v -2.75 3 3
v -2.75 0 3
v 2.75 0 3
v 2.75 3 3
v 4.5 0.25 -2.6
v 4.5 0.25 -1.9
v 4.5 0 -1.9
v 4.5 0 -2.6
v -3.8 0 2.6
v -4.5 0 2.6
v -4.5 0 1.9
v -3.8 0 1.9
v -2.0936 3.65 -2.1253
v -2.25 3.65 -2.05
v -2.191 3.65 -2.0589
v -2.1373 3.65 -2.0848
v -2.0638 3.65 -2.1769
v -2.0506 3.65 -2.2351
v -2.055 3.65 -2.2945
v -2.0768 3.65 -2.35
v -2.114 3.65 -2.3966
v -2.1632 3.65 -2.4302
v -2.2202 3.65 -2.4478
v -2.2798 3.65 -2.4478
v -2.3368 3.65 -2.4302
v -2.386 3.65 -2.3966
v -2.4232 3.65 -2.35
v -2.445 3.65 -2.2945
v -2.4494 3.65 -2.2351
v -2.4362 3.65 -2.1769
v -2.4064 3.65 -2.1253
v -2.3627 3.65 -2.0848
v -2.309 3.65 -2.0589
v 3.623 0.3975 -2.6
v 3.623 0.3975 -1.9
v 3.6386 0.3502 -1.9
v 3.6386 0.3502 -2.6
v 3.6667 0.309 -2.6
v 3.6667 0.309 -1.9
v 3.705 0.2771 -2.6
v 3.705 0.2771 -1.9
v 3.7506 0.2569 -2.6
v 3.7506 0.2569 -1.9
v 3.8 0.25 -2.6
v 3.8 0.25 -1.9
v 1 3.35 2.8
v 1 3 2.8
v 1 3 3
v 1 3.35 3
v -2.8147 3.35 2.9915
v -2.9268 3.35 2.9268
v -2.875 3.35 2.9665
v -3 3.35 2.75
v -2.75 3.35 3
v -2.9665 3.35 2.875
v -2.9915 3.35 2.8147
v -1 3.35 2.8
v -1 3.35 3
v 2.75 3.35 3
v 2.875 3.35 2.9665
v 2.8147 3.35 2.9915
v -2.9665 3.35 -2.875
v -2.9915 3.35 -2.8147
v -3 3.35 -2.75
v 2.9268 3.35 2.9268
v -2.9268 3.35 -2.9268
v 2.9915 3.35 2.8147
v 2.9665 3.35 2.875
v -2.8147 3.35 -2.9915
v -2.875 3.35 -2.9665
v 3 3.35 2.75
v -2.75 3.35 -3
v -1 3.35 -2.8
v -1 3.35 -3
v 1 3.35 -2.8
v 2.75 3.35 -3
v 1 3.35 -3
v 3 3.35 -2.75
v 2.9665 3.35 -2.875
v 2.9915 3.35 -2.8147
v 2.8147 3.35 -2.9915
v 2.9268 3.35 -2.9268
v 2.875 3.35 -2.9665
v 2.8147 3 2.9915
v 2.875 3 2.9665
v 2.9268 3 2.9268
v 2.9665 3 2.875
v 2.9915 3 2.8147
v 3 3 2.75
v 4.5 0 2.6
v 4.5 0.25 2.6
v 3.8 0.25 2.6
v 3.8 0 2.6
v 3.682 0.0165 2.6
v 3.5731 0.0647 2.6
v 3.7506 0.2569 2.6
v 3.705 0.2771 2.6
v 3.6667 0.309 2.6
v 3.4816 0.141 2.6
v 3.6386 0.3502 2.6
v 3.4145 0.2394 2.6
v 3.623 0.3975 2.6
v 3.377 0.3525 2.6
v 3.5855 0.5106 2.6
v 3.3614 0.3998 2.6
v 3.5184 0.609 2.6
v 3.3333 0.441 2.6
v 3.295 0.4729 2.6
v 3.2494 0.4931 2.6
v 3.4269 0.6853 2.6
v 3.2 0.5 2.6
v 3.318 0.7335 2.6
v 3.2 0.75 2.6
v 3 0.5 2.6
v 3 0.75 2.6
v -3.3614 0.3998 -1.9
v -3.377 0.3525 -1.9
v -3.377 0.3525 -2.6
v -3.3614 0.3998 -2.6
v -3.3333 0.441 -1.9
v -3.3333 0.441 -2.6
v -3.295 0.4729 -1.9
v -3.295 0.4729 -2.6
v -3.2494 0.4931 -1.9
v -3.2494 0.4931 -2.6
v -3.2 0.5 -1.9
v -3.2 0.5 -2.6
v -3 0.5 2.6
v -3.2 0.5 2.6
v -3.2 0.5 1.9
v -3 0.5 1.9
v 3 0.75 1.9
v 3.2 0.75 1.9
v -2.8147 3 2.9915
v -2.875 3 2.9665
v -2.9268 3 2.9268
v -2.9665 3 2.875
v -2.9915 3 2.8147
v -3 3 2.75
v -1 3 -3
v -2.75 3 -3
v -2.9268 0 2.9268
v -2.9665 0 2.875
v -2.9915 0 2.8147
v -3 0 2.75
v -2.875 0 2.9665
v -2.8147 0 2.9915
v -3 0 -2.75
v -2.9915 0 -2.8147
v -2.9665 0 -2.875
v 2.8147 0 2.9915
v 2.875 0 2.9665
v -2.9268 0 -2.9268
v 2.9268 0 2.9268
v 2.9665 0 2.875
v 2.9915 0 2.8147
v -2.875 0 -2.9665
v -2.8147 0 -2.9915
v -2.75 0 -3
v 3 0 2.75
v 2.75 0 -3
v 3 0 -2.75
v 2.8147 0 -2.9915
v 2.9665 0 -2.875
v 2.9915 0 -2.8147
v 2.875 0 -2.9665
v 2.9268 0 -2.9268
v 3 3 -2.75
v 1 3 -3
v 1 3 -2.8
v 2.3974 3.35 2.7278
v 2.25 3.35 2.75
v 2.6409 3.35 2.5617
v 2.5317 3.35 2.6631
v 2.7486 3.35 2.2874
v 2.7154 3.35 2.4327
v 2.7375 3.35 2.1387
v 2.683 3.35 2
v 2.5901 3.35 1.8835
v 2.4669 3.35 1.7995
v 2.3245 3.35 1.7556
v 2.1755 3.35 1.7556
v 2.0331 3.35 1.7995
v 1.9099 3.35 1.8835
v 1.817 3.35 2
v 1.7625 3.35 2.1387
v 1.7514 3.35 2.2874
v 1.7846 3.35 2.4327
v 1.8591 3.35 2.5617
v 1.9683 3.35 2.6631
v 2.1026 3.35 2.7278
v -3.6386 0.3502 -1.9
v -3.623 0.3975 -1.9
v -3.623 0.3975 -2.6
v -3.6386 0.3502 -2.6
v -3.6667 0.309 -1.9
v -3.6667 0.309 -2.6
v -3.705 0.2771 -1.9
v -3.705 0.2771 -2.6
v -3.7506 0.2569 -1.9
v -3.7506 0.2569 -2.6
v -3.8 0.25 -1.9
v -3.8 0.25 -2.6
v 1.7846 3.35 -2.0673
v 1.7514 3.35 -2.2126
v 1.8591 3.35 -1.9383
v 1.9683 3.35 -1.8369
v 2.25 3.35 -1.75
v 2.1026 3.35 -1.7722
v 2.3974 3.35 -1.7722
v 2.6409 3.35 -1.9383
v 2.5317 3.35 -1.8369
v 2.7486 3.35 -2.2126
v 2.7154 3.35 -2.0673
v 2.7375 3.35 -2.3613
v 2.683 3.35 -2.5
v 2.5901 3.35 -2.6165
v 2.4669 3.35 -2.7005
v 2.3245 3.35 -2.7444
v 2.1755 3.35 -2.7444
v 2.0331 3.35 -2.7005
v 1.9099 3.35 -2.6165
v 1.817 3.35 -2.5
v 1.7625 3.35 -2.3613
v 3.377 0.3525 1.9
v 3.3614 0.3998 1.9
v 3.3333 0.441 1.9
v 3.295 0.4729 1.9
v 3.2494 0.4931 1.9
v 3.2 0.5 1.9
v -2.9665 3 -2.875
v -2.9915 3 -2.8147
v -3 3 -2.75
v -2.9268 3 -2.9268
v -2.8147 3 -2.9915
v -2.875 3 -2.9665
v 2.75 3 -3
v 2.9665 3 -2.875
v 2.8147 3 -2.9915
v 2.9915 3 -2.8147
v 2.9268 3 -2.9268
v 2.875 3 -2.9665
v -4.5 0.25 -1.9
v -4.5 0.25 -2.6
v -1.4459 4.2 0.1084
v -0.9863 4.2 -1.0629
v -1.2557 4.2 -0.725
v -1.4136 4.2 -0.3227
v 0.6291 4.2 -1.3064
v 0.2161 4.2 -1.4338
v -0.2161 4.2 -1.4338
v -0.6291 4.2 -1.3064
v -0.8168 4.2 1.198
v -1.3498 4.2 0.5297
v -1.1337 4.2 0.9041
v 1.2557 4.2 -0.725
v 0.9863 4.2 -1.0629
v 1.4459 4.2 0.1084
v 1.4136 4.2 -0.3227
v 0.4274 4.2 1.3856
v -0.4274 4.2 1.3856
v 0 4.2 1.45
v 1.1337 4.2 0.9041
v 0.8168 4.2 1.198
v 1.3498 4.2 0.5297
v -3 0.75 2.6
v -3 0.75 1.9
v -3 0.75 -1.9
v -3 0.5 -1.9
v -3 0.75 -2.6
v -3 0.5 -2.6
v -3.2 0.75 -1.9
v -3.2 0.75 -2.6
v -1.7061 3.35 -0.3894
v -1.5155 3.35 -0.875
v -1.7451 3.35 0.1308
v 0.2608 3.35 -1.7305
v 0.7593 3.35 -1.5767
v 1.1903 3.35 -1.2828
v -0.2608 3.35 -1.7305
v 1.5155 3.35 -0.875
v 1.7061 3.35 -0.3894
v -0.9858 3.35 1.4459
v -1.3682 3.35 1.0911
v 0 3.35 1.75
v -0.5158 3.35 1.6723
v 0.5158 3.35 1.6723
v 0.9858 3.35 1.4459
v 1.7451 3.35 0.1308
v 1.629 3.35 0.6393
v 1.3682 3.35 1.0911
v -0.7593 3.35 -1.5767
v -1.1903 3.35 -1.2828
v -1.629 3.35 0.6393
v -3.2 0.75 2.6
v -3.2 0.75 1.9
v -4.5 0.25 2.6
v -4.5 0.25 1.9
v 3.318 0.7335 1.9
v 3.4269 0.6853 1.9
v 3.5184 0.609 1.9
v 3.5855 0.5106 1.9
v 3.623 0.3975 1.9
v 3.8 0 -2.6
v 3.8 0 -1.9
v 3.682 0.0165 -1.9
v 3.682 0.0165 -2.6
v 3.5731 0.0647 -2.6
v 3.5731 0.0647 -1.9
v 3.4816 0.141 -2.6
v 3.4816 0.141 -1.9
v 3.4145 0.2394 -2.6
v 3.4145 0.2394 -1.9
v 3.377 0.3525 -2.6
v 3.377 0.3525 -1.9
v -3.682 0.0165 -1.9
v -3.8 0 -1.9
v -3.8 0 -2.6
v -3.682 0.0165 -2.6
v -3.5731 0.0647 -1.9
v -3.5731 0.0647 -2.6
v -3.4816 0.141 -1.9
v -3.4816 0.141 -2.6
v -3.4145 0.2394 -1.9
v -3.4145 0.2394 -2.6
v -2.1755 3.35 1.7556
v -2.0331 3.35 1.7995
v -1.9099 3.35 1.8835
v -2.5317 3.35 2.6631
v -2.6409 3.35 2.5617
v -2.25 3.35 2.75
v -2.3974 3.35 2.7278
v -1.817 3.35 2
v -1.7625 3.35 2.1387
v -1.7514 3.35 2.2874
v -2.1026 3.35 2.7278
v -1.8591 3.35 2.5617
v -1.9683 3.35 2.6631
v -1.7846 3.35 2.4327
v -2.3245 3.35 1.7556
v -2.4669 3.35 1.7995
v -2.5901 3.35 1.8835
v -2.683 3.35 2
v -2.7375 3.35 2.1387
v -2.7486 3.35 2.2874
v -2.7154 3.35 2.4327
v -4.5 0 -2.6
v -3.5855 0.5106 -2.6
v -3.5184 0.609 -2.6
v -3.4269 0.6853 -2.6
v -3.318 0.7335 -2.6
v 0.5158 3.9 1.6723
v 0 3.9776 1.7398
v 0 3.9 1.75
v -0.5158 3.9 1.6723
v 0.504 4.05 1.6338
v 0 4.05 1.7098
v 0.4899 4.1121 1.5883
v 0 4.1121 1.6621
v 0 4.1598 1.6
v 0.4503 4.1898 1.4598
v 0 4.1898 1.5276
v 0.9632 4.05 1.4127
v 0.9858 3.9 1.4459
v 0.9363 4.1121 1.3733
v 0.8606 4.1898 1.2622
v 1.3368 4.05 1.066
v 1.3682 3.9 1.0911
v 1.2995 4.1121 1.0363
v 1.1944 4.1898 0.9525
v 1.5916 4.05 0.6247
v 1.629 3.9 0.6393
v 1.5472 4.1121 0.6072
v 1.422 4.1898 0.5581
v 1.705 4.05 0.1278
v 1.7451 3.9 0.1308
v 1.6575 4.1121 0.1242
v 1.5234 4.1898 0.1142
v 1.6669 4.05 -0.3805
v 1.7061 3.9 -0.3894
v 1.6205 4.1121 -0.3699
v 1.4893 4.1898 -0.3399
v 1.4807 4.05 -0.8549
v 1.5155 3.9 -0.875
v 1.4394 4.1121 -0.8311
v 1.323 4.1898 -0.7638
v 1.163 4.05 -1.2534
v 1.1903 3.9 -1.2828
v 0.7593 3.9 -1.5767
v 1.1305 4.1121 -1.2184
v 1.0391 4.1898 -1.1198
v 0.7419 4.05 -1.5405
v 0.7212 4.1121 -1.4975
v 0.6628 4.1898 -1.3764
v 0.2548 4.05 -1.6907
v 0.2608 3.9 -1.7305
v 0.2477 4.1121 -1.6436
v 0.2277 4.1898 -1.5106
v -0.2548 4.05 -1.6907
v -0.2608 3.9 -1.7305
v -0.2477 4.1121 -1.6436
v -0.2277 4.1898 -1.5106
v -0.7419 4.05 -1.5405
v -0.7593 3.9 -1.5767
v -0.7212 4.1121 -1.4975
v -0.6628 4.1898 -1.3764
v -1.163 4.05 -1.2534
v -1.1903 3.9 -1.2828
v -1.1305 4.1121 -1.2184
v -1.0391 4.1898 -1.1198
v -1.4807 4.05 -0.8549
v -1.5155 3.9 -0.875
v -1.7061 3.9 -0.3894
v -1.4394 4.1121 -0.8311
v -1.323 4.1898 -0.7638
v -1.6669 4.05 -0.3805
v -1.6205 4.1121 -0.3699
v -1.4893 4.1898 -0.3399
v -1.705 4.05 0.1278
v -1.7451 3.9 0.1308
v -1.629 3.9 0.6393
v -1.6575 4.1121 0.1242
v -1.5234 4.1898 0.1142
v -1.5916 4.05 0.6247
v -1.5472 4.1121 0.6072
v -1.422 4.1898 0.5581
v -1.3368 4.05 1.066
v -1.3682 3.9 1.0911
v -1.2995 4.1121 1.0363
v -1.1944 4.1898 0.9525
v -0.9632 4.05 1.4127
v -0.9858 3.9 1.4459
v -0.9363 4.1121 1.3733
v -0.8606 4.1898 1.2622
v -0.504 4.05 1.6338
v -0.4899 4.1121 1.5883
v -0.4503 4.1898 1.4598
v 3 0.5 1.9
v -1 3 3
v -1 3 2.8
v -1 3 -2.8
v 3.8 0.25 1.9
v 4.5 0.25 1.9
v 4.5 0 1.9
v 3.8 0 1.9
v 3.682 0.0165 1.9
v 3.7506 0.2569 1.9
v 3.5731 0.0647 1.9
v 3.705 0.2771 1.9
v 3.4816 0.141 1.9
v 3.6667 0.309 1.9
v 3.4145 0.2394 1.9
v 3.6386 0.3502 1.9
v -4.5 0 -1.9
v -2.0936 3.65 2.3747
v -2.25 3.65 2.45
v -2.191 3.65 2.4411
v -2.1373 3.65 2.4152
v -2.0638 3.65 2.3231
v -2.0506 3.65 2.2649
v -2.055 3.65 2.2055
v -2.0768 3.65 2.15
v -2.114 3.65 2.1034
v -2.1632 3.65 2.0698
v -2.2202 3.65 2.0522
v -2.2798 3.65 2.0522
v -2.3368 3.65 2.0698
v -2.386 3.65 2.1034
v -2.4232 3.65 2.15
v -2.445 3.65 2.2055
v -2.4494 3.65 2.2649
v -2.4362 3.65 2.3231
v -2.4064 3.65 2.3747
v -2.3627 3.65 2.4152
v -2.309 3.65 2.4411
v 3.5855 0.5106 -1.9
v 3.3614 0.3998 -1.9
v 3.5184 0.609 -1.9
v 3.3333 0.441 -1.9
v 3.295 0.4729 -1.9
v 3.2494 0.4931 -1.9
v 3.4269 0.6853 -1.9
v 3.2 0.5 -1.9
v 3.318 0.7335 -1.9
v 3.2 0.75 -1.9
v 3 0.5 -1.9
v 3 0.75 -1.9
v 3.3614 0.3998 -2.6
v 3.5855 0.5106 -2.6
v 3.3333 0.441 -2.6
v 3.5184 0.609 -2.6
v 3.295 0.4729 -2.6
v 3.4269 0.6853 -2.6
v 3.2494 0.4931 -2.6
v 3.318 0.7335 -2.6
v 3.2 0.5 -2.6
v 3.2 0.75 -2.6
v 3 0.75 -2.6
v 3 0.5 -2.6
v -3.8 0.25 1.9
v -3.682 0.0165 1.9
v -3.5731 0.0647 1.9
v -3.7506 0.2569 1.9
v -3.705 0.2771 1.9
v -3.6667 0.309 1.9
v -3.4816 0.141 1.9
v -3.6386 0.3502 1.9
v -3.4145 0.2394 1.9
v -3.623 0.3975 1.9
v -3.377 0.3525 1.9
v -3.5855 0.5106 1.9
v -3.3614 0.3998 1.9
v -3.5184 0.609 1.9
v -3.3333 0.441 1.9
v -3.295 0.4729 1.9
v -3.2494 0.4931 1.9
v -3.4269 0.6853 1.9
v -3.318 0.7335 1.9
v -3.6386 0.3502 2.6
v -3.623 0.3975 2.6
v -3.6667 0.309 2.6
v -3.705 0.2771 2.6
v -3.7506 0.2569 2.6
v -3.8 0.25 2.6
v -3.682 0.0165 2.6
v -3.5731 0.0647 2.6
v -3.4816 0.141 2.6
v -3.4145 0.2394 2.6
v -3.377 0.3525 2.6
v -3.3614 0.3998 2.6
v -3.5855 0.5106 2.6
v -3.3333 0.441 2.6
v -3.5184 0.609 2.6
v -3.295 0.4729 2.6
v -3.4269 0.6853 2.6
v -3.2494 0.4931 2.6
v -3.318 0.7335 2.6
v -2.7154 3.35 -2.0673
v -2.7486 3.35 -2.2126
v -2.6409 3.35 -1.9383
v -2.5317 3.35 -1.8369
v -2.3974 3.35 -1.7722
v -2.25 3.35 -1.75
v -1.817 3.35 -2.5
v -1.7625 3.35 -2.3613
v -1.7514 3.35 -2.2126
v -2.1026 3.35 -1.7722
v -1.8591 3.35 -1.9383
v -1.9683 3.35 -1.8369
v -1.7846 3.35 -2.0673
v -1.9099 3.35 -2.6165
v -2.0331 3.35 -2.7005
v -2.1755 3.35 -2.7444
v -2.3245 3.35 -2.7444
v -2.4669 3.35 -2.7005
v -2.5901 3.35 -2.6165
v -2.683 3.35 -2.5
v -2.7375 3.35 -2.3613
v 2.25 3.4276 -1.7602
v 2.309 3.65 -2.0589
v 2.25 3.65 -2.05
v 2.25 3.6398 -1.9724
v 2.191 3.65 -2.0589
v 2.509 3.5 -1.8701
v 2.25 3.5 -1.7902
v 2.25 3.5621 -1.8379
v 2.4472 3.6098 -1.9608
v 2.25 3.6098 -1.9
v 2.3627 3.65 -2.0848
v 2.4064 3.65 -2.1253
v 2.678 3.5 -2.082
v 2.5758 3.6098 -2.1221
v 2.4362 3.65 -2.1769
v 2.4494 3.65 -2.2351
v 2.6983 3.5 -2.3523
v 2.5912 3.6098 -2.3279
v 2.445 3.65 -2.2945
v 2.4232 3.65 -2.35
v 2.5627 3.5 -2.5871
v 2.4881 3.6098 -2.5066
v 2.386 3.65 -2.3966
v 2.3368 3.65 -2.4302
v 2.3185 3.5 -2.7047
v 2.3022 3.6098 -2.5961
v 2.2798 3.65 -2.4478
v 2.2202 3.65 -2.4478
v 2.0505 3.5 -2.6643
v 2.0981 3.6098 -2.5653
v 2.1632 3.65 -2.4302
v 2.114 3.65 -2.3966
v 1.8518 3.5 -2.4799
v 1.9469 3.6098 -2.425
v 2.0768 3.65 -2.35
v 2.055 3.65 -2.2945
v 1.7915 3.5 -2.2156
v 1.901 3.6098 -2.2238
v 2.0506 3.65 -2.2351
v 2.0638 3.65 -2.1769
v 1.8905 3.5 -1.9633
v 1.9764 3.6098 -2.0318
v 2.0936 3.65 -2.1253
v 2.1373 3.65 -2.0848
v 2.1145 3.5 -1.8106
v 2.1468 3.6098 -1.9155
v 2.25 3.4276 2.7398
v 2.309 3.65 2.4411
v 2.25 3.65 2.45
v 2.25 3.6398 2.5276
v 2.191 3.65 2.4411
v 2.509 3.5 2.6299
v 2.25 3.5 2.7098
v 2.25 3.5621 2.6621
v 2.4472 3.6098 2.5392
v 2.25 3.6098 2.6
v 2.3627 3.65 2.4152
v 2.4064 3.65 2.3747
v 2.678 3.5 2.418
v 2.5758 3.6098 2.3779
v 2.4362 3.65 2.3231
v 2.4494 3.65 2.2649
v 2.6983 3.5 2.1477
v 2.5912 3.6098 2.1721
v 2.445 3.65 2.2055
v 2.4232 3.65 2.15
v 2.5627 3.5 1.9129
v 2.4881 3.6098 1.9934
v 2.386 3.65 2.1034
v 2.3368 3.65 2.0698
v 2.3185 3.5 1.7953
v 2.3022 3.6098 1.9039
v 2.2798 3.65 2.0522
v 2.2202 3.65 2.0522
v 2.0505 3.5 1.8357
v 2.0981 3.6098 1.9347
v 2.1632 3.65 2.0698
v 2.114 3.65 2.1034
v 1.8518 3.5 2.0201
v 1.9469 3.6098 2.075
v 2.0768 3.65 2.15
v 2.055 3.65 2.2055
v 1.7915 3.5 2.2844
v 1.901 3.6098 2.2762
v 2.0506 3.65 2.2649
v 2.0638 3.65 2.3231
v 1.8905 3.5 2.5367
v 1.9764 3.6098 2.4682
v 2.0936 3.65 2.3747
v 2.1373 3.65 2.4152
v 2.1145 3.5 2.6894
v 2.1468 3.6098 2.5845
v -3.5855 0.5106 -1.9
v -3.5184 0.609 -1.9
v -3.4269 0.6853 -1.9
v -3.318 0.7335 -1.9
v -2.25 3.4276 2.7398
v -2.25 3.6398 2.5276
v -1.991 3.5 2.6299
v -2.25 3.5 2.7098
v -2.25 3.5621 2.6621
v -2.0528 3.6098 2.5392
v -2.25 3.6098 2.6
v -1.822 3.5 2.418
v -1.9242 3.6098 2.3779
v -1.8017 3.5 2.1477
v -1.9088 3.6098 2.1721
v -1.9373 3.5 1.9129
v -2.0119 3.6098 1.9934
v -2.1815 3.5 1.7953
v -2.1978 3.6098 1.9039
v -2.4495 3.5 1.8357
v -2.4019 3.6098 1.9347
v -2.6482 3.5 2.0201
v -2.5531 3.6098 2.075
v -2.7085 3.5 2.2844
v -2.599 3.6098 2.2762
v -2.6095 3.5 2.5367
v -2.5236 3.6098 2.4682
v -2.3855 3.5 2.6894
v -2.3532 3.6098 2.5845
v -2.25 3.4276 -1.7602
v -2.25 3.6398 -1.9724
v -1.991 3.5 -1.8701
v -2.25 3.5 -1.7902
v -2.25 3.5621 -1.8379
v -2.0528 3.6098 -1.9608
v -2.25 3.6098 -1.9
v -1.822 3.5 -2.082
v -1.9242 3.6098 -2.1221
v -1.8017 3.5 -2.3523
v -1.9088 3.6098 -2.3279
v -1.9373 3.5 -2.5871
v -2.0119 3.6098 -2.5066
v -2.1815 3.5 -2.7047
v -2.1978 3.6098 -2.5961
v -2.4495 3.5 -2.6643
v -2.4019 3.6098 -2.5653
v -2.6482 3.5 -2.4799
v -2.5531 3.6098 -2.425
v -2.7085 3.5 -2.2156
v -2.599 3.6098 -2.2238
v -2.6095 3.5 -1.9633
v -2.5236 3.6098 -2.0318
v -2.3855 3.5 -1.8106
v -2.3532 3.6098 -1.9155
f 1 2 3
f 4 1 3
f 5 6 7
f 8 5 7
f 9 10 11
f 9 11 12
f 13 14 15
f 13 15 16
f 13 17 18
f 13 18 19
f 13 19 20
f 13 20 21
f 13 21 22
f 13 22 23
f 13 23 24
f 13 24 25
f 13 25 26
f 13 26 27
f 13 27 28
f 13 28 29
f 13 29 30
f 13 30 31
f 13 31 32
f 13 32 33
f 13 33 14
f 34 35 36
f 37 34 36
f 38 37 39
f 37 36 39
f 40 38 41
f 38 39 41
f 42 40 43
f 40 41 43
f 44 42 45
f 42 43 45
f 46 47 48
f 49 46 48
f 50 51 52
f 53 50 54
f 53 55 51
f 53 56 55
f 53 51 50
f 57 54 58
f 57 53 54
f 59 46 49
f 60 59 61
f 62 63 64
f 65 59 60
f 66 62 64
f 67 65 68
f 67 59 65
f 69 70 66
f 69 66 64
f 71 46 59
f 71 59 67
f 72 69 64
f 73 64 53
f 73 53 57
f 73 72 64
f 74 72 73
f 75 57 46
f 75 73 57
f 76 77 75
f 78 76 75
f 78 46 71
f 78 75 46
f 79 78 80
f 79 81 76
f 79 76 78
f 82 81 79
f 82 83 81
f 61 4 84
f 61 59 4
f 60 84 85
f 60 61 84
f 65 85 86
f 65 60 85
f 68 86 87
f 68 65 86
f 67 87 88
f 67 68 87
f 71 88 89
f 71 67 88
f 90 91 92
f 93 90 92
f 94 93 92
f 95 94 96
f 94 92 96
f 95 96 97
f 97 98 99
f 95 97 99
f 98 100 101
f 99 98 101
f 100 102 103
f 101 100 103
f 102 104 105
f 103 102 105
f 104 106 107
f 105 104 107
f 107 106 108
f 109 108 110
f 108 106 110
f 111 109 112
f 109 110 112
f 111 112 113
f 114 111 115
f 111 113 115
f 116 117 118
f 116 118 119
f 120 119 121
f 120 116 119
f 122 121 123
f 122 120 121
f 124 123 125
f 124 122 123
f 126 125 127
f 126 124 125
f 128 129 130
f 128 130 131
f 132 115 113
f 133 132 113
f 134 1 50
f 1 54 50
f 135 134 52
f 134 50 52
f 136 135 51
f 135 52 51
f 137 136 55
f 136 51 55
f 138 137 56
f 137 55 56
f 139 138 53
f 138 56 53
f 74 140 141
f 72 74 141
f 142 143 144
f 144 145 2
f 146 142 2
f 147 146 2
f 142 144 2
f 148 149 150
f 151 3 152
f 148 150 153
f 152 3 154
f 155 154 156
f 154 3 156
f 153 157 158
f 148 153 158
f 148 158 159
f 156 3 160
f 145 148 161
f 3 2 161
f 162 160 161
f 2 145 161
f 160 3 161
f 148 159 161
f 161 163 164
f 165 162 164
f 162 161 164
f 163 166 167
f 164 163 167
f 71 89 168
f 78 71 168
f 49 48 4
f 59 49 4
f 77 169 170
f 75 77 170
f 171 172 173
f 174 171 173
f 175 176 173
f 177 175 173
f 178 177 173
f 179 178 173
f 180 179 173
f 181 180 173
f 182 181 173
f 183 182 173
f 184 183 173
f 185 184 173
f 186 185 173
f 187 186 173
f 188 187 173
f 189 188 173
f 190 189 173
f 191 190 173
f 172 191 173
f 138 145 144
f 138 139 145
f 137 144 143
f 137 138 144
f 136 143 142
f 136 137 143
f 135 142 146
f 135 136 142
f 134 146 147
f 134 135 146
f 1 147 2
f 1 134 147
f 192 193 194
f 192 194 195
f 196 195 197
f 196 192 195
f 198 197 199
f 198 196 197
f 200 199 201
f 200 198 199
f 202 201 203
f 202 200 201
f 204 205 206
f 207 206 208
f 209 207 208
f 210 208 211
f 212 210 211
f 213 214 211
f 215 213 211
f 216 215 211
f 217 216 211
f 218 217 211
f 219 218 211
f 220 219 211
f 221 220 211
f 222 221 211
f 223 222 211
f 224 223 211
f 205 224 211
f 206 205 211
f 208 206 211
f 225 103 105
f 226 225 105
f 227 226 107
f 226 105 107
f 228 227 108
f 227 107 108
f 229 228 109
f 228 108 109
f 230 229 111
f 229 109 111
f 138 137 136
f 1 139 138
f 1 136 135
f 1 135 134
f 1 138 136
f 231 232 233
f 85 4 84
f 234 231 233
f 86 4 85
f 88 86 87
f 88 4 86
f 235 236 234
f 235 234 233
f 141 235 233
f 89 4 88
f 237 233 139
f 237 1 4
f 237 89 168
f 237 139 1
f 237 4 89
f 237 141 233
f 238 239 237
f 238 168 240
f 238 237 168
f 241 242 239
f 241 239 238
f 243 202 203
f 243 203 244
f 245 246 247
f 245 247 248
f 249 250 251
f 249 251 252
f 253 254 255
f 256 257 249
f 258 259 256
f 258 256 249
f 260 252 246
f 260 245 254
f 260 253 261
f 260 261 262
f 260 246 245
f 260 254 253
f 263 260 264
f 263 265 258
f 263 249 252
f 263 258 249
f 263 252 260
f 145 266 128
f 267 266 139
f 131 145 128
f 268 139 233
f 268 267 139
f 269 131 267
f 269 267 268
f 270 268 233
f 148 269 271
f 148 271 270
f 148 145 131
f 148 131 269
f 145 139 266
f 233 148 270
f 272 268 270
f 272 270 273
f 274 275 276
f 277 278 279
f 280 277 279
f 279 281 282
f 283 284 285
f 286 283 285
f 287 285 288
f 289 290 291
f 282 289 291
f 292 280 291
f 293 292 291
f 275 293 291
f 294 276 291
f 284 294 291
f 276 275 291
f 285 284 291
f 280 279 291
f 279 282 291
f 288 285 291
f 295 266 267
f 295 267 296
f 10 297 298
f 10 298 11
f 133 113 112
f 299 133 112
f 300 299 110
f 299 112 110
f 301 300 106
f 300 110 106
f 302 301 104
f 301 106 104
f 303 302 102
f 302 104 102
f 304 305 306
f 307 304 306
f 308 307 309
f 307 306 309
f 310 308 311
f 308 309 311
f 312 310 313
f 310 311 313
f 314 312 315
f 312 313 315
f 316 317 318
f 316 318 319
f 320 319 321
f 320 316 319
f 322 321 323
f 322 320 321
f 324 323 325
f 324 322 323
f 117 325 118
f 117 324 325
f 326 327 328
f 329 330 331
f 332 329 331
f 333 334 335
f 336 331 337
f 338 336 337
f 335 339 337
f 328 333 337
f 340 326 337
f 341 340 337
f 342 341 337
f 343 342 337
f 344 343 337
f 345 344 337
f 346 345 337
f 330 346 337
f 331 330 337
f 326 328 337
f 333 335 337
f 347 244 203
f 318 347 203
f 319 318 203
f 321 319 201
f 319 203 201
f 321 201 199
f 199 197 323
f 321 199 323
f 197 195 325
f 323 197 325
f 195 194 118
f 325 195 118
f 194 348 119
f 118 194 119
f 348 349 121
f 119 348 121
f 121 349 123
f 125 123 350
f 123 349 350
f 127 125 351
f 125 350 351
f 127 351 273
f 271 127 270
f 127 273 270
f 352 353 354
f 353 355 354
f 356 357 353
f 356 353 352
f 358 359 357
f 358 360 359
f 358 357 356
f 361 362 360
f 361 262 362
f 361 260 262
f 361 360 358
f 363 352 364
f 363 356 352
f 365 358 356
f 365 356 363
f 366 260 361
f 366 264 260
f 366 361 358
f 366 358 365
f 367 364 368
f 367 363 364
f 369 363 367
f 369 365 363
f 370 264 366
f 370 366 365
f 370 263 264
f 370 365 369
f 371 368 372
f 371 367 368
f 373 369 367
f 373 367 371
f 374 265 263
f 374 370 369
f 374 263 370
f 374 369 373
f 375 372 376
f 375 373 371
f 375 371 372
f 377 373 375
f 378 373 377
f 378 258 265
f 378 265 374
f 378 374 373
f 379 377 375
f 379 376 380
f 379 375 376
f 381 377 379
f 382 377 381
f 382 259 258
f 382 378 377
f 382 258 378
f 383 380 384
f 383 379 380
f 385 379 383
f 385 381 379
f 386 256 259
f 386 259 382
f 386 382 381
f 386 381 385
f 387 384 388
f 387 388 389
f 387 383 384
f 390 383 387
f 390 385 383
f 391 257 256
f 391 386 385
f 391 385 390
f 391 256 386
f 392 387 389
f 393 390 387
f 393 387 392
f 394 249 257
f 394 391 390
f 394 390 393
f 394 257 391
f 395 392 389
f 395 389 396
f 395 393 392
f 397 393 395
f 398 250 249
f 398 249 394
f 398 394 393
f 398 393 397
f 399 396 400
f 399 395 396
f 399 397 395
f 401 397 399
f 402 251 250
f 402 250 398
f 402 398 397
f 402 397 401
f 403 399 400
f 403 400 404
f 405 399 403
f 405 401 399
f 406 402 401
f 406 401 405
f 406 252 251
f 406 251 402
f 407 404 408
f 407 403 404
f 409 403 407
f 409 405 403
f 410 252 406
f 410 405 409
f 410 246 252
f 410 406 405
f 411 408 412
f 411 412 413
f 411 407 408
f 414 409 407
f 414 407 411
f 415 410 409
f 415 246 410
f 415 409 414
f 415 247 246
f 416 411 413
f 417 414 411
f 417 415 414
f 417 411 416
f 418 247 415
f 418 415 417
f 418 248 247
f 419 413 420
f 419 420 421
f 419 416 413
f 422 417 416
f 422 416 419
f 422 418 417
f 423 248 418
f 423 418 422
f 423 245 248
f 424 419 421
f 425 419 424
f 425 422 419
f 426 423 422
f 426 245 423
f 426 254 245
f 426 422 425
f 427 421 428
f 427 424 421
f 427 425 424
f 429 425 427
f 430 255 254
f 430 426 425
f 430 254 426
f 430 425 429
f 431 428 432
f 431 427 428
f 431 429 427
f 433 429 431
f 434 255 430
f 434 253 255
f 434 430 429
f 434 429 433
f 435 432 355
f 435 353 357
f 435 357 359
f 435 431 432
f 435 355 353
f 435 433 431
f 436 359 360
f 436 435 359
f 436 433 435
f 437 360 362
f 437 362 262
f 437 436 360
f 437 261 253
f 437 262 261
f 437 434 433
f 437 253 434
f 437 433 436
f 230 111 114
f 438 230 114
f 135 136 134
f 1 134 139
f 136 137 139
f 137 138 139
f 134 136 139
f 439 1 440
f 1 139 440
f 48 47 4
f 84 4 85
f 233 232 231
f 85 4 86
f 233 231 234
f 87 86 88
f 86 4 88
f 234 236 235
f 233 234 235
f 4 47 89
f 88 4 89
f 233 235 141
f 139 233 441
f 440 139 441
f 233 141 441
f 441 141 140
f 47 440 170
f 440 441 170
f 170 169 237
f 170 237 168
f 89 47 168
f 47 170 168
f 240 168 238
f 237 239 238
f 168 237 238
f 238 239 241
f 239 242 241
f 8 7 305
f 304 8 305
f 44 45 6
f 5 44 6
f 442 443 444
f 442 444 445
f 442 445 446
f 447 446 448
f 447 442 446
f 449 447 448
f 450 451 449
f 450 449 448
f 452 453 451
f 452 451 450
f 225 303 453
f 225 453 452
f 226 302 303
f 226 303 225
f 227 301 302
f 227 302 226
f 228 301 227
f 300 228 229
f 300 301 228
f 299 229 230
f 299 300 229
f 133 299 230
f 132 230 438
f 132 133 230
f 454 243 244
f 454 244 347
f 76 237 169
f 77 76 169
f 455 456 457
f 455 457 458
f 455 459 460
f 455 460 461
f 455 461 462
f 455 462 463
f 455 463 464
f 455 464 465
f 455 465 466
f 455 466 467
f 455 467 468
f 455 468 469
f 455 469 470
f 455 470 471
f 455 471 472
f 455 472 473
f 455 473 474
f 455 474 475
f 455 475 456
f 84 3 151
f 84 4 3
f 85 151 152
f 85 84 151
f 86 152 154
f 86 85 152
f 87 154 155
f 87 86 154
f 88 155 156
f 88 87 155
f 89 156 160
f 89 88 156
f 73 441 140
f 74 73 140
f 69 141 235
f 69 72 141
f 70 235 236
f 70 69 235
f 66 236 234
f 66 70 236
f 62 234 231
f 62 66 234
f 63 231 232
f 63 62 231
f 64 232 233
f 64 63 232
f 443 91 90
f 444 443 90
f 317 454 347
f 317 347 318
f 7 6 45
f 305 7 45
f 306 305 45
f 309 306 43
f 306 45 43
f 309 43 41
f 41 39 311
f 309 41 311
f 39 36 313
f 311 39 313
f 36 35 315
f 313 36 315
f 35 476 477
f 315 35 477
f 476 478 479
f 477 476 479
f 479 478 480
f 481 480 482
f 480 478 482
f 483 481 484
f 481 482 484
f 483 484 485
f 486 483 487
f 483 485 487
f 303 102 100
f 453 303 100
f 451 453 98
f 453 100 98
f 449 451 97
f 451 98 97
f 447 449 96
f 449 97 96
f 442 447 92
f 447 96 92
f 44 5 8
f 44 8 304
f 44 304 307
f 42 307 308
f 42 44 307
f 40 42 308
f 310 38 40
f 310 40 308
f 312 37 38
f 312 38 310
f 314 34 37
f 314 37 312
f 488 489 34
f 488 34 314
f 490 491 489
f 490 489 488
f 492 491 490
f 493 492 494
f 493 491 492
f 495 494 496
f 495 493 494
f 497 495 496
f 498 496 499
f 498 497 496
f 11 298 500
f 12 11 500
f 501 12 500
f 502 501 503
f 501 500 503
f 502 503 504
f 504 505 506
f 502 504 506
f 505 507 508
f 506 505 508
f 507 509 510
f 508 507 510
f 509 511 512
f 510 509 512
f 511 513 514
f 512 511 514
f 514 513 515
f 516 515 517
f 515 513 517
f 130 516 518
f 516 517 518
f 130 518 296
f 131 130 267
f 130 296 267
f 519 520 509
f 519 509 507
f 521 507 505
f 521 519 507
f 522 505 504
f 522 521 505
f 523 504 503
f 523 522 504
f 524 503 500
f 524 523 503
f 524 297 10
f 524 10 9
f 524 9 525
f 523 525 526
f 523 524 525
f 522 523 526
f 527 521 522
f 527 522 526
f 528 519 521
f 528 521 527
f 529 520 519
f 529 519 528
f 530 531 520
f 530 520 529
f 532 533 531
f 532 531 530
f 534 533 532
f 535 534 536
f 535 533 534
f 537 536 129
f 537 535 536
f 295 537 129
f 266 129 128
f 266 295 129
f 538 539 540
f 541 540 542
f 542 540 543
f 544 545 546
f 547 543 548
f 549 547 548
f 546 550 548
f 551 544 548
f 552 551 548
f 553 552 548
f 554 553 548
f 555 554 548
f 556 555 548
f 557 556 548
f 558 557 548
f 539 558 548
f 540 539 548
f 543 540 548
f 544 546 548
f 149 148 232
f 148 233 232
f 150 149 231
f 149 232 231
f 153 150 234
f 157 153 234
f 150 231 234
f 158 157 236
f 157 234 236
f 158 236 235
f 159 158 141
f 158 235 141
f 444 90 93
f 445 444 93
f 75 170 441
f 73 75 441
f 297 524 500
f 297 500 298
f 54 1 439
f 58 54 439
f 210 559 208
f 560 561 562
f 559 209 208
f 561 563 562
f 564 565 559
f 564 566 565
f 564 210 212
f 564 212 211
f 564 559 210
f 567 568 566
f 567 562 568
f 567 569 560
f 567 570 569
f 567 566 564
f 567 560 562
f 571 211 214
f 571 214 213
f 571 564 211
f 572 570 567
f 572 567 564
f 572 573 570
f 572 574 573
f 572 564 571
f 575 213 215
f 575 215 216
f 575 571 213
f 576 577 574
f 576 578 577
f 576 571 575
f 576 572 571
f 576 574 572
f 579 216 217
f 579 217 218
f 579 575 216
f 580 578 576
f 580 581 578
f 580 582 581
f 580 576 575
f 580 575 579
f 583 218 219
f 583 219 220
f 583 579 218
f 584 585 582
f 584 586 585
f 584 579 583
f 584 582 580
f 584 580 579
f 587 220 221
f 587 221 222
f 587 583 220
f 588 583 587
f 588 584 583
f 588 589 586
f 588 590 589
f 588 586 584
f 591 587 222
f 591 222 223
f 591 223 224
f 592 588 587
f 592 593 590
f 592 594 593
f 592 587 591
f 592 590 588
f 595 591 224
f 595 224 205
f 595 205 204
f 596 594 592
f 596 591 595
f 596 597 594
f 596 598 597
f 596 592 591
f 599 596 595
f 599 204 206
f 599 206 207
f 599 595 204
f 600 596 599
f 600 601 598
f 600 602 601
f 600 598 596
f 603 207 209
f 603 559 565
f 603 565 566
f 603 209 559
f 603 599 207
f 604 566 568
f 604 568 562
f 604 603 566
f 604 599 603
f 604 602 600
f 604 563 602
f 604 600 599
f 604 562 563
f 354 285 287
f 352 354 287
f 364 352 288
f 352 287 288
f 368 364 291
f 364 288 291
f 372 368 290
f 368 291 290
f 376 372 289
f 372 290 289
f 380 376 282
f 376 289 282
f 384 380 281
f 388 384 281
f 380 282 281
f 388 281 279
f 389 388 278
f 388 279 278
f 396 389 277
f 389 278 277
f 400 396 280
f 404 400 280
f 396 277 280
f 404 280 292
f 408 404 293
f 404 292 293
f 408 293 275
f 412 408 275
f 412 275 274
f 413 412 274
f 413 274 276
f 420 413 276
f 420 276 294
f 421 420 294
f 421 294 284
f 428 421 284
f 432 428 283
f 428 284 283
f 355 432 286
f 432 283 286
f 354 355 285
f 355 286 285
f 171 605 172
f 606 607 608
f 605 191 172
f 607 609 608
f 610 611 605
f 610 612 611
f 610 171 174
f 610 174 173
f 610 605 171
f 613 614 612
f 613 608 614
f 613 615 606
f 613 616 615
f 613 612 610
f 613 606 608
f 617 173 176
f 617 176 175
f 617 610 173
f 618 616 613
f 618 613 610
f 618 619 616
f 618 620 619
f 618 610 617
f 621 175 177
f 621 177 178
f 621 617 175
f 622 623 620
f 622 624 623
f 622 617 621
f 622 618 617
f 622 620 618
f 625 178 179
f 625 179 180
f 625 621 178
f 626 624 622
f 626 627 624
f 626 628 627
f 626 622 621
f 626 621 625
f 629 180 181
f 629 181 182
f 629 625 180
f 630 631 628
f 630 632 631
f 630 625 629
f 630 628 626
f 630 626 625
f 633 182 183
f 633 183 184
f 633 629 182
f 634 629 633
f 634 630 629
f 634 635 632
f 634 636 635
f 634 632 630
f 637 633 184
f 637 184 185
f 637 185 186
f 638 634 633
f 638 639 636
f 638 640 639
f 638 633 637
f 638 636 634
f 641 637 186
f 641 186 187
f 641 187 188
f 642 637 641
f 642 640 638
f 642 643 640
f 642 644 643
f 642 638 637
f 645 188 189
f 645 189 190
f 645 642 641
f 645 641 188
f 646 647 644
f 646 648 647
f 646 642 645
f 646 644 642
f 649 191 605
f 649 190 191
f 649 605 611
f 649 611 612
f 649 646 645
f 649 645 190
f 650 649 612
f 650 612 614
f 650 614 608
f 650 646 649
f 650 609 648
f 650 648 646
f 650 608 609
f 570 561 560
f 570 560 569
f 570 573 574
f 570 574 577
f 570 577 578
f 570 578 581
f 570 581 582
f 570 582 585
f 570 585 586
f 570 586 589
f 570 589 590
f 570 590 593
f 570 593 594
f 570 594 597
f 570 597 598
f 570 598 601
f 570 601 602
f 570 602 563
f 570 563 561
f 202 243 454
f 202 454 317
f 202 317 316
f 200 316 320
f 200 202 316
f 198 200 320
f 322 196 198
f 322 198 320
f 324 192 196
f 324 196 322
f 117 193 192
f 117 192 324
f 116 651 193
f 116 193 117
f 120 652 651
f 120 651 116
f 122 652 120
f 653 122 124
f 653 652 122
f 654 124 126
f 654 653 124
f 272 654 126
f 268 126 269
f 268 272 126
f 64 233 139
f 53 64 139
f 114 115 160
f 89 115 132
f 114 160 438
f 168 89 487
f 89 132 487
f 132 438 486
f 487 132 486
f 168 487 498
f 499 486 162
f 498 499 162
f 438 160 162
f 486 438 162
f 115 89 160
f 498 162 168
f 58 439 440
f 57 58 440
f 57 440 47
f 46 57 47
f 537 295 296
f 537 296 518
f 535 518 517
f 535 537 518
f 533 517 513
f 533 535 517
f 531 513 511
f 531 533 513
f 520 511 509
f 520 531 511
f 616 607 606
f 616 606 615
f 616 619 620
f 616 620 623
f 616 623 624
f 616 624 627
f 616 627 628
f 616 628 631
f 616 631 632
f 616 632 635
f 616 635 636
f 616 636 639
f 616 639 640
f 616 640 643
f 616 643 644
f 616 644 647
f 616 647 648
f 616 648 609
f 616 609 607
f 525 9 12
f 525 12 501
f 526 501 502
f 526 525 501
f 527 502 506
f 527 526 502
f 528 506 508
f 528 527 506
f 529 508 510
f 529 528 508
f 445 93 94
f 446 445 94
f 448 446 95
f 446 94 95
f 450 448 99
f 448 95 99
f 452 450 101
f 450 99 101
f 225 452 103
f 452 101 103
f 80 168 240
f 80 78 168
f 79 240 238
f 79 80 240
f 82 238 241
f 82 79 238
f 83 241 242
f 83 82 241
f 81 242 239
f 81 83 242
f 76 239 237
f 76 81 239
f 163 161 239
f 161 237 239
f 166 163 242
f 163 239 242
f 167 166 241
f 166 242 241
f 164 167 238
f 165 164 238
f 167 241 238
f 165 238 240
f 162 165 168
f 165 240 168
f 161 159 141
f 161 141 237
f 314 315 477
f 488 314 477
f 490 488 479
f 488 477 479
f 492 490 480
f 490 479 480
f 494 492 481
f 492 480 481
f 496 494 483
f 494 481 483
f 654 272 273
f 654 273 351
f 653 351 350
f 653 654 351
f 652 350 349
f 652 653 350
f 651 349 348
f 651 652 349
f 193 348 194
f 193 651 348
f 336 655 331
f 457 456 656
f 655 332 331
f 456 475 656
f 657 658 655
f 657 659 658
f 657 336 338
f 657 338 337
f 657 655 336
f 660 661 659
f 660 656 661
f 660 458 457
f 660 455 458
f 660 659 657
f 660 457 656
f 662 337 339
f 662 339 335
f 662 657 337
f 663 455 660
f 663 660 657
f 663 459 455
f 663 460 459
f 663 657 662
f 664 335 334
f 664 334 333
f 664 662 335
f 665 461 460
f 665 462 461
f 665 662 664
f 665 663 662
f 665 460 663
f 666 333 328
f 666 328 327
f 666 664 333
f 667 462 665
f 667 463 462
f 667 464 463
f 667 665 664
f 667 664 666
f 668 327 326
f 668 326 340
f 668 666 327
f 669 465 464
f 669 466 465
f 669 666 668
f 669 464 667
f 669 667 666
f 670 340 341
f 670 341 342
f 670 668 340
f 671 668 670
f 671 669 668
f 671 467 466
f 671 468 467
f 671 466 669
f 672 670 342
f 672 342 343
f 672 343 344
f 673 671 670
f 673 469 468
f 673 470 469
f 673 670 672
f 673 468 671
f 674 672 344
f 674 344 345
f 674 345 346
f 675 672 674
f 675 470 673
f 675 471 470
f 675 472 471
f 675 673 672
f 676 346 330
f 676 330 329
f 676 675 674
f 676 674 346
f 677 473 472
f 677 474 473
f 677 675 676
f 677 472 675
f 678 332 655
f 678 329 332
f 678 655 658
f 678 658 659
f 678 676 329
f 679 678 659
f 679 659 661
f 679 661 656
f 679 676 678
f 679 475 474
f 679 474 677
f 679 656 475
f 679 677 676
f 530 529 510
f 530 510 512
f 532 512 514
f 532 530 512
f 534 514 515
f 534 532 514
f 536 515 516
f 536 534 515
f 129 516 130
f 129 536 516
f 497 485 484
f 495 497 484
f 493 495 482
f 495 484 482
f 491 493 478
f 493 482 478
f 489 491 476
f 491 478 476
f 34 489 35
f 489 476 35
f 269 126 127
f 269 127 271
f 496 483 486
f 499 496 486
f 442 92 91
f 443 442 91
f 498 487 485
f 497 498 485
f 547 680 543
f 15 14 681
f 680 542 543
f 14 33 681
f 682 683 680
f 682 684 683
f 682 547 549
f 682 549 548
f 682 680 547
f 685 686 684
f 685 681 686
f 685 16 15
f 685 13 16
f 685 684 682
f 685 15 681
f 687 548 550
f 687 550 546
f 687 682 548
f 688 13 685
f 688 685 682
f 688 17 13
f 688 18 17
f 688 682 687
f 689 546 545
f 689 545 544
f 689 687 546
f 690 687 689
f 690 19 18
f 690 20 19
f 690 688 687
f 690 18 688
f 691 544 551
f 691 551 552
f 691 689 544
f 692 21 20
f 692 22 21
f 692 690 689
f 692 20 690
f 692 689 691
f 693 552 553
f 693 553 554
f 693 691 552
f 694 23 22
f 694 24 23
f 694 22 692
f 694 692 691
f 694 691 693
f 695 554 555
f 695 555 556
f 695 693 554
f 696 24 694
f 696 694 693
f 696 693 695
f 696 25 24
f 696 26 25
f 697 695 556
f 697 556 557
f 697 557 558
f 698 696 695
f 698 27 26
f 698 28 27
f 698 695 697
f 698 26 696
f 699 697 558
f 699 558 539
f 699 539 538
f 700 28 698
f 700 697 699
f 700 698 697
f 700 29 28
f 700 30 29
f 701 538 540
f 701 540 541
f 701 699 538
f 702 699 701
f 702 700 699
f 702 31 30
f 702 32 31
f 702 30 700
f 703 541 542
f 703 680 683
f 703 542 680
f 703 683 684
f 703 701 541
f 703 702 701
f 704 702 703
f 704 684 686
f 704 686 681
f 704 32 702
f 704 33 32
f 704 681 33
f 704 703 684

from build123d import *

# Parameters (mm, degrees)
SKETCH1_W             = 6
SKETCH1_H             = 6
BOSS_EXTRUDE1_DEPTH   = 3
BOSS_EXTRUDE4_DEPTH   = 0.35
SKETCH2_R             = 1.75
BOSS_EXTRUDE2_DEPTH   = 0.85
SKETCH3_R             = 0.5
BOSS_EXTRUDE3_DEPTH   = 0.3
BOSS_EXTRUDE3_2_DEPTH = 0.3
BOSS_EXTRUDE3_3_DEPTH = 0.3
BOSS_EXTRUDE3_4_DEPTH = 0.3
BOSS_EXTRUDE5_START   = -0.4
BOSS_EXTRUDE5_DEPTH   = 0.7
LPATTERN1_COUNT       = 2
LPATTERN1_PITCH       = 4.5
FILLET1_R             = 0.25
FILLET2_R             = 0.25
FILLET3_R             = 0.3
FILLET4_R             = 0.3
FILLET5_R             = 0.3
FILLET6_R             = 0.3
FILLET7_R             = 0.3


with BuildPart() as part:
    # Sketch1 → Boss-Extrude1 (new body)
    with BuildSketch(Plane(origin=(0, 0, 0), x_dir=(1, 0, 0), z_dir=(0, 1, 0))):
        Rectangle(SKETCH1_W, SKETCH1_H)
    extrude(amount=BOSS_EXTRUDE1_DEPTH)

    # Sketch5 → Boss-Extrude5 (add)
    with BuildSketch(Plane.XY.offset(3).offset(BOSS_EXTRUDE5_START)):
        with BuildLine():
            Line((3, 0.75), (3.2, 0.75))
            ThreePointArc((3.2, 0.75), (3.475279292, 0.65033515), (3.62295082, 0.397540984))
            ThreePointArc((3.62295082, 0.397540984), (3.684766808, 0.29172017), (3.8, 0.25))
            Line((3.8, 0.25), (4.5, 0.25))
            Line((4.5, 0.25), (4.5, 0))
            Line((4.5, 0), (3.8, 0))
            ThreePointArc((3.8, 0), (3.524720708, 0.09966485), (3.37704918, 0.352459016))
            ThreePointArc((3.37704918, 0.352459016), (3.315233192, 0.45827983), (3.2, 0.5))
            Line((3.2, 0.5), (3, 0.5))
            Line((3, 0.5), (3, 0.75))
        make_face()
        with BuildLine():
            Line((-3.2, 0.5), (-3, 0.5))
            Line((-3, 0.5), (-3, 0.75))
            Line((-3, 0.75), (-3.2, 0.75))
            ThreePointArc((-3.2, 0.75), (-3.475279292, 0.65033515), (-3.62295082, 0.397540984))
            ThreePointArc((-3.62295082, 0.397540984), (-3.684766808, 0.29172017), (-3.8, 0.25))
            Line((-3.8, 0.25), (-4.5, 0.25))
            Line((-4.5, 0.25), (-4.5, 0))
            Line((-4.5, 0), (-3.8, 0))
            ThreePointArc((-3.8, 0), (-3.524720708, 0.09966485), (-3.37704918, 0.352459016))
            ThreePointArc((-3.37704918, 0.352459016), (-3.315233192, 0.45827983), (-3.2, 0.5))
        make_face()
    boss_extrude5 = extrude(amount=-BOSS_EXTRUDE5_DEPTH)

    # LPattern1: Boss-Extrude5 ×2
    with Locations(*[(0, 0, -i * LPATTERN1_PITCH) for i in range(1, LPATTERN1_COUNT)]):
        add(boss_extrude5)

    # Fillet1
    fillet1_edges = [part.edges().sort_by_distance(p)[0] for p in [
        (-3, 1.5, -3),
        (3, 1.5, -3),
        (3, 1.5, 3),
        (-3, 1.5, 3),
    ]]
    fillet(fillet1_edges, radius=FILLET1_R)


with BuildPart() as body_2:
    # Sketch4 → Boss-Extrude4 (new body)
    with BuildSketch(Plane(origin=(0, 3, 0), x_dir=(1, 0, 0), z_dir=(0, 1, 0))):
        Polygon((-3, -3), (-1, -3), (-1, -2.8), (1, -2.8), (1, -3), (3, -3), (3, 3), (1, 3), (1, 2.8), (-1, 2.8), (-1, 3), (-3, 3), align=None)
    extrude(amount=BOSS_EXTRUDE4_DEPTH)

    # Fillet2
    fillet2_edges = [body_2.edges().sort_by_distance(p)[0] for p in [
        (3, 3.175, -3),
        (3, 3.175, 3),
        (-3, 3.175, 3),
        (-3, 3.175, -3),
    ]]
    fillet(fillet2_edges, radius=FILLET2_R)


with BuildPart() as body_3:
    # Sketch2 → Boss-Extrude2 (new body)
    with BuildSketch(Plane(origin=(0, 3.35, 0), x_dir=(1, 0, 0), z_dir=(0, 1, 0))):
        with Locations(Location((0, 0, 0), (0, 0, 270))):
            Circle(SKETCH2_R)
    extrude(amount=BOSS_EXTRUDE2_DEPTH)

    # Fillet7
    fillet7_edges = [body_3.edges().sort_by_distance(p)[0] for p in [
        (0, 4.2, -1.75),
    ]]
    fillet(fillet7_edges, radius=FILLET7_R)


with BuildPart() as body_4:
    # Sketch3 → Boss-Extrude3 (new body)
    with BuildSketch(Plane(origin=(0, 3.35, 0), x_dir=(1, 0, 0), z_dir=(0, 1, 0))):
        with Locations(Location((2.25, -2.25, 0), (0, 0, 270))):
            Circle(SKETCH3_R)
    extrude(amount=BOSS_EXTRUDE3_DEPTH)

    # Fillet3
    # the kernel refuses this fillet: 0.3 mm, written as the material it takes off along each edge
    with BuildSketch(Plane(origin=(2.25, 3.65, 2.25), x_dir=(0, 0, 1), z_dir=(-1, 0, 0))) as fillet3_piece_1:
        with BuildLine():
            CenterArc((0.5 - FILLET3_R, -FILLET3_R), FILLET3_R, 0, 90)
            Line((0.5 - FILLET3_R, 0), (0.5, 0))
            Line((0.5, 0), (0.5, -FILLET3_R))
        make_face()
    revolve(axis=Axis((2.25, 3.65, 2.25), (0, 1, 0)), mode=Mode.SUBTRACT)


with BuildPart() as body_5:
    # Sketch3 → Boss-Extrude3 2 (new body)
    with BuildSketch(Plane(origin=(0, 3.35, 0), x_dir=(1, 0, 0), z_dir=(0, 1, 0))):
        with Locations(Location((2.25, 2.25, 0), (0, 0, 270))):
            Circle(SKETCH3_R)
    extrude(amount=BOSS_EXTRUDE3_2_DEPTH)

    # Fillet6
    # the kernel refuses this fillet: 0.3 mm, written as the material it takes off along each edge
    with BuildSketch(Plane(origin=(2.25, 3.65, -2.25), x_dir=(0, 0, 1), z_dir=(-1, 0, 0))) as fillet6_piece_1:
        with BuildLine():
            CenterArc((0.5 - FILLET6_R, -FILLET6_R), FILLET6_R, 0, 90)
            Line((0.5 - FILLET6_R, 0), (0.5, 0))
            Line((0.5, 0), (0.5, -FILLET6_R))
        make_face()
    revolve(axis=Axis((2.25, 3.65, -2.25), (0, 1, 0)), mode=Mode.SUBTRACT)


with BuildPart() as body_6:
    # Sketch3 → Boss-Extrude3 3 (new body)
    with BuildSketch(Plane(origin=(0, 3.35, 0), x_dir=(1, 0, 0), z_dir=(0, 1, 0))):
        with Locations(Location((-2.25, 2.25, 0), (0, 0, 270))):
            Circle(SKETCH3_R)
    extrude(amount=BOSS_EXTRUDE3_3_DEPTH)

    # Fillet5
    # the kernel refuses this fillet: 0.3 mm, written as the material it takes off along each edge
    with BuildSketch(Plane(origin=(-2.25, 3.65, -2.25), x_dir=(0, 0, 1), z_dir=(-1, 0, 0))) as fillet5_piece_1:
        with BuildLine():
            CenterArc((0.5 - FILLET5_R, -FILLET5_R), FILLET5_R, 0, 90)
            Line((0.5 - FILLET5_R, 0), (0.5, 0))
            Line((0.5, 0), (0.5, -FILLET5_R))
        make_face()
    revolve(axis=Axis((-2.25, 3.65, -2.25), (0, 1, 0)), mode=Mode.SUBTRACT)


with BuildPart() as body_7:
    # Sketch3 → Boss-Extrude3 4 (new body)
    with BuildSketch(Plane(origin=(0, 3.35, 0), x_dir=(1, 0, 0), z_dir=(0, 1, 0))):
        with Locations(Location((-2.25, -2.25, 0), (0, 0, 270))):
            Circle(SKETCH3_R)
    extrude(amount=BOSS_EXTRUDE3_4_DEPTH)

    # Fillet4
    # the kernel refuses this fillet: 0.3 mm, written as the material it takes off along each edge
    with BuildSketch(Plane(origin=(-2.25, 3.65, 2.25), x_dir=(0, 0, 1), z_dir=(-1, 0, 0))) as fillet4_piece_1:
        with BuildLine():
            CenterArc((0.5 - FILLET4_R, -FILLET4_R), FILLET4_R, 0, 90)
            Line((0.5 - FILLET4_R, 0), (0.5, 0))
            Line((0.5, 0), (0.5, -FILLET4_R))
        make_face()
    revolve(axis=Axis((-2.25, 3.65, 2.25), (0, 1, 0)), mode=Mode.SUBTRACT)


solid = Compound([part.part, body_2.part, body_3.part, body_4.part, body_5.part, body_6.part, body_7.part])
